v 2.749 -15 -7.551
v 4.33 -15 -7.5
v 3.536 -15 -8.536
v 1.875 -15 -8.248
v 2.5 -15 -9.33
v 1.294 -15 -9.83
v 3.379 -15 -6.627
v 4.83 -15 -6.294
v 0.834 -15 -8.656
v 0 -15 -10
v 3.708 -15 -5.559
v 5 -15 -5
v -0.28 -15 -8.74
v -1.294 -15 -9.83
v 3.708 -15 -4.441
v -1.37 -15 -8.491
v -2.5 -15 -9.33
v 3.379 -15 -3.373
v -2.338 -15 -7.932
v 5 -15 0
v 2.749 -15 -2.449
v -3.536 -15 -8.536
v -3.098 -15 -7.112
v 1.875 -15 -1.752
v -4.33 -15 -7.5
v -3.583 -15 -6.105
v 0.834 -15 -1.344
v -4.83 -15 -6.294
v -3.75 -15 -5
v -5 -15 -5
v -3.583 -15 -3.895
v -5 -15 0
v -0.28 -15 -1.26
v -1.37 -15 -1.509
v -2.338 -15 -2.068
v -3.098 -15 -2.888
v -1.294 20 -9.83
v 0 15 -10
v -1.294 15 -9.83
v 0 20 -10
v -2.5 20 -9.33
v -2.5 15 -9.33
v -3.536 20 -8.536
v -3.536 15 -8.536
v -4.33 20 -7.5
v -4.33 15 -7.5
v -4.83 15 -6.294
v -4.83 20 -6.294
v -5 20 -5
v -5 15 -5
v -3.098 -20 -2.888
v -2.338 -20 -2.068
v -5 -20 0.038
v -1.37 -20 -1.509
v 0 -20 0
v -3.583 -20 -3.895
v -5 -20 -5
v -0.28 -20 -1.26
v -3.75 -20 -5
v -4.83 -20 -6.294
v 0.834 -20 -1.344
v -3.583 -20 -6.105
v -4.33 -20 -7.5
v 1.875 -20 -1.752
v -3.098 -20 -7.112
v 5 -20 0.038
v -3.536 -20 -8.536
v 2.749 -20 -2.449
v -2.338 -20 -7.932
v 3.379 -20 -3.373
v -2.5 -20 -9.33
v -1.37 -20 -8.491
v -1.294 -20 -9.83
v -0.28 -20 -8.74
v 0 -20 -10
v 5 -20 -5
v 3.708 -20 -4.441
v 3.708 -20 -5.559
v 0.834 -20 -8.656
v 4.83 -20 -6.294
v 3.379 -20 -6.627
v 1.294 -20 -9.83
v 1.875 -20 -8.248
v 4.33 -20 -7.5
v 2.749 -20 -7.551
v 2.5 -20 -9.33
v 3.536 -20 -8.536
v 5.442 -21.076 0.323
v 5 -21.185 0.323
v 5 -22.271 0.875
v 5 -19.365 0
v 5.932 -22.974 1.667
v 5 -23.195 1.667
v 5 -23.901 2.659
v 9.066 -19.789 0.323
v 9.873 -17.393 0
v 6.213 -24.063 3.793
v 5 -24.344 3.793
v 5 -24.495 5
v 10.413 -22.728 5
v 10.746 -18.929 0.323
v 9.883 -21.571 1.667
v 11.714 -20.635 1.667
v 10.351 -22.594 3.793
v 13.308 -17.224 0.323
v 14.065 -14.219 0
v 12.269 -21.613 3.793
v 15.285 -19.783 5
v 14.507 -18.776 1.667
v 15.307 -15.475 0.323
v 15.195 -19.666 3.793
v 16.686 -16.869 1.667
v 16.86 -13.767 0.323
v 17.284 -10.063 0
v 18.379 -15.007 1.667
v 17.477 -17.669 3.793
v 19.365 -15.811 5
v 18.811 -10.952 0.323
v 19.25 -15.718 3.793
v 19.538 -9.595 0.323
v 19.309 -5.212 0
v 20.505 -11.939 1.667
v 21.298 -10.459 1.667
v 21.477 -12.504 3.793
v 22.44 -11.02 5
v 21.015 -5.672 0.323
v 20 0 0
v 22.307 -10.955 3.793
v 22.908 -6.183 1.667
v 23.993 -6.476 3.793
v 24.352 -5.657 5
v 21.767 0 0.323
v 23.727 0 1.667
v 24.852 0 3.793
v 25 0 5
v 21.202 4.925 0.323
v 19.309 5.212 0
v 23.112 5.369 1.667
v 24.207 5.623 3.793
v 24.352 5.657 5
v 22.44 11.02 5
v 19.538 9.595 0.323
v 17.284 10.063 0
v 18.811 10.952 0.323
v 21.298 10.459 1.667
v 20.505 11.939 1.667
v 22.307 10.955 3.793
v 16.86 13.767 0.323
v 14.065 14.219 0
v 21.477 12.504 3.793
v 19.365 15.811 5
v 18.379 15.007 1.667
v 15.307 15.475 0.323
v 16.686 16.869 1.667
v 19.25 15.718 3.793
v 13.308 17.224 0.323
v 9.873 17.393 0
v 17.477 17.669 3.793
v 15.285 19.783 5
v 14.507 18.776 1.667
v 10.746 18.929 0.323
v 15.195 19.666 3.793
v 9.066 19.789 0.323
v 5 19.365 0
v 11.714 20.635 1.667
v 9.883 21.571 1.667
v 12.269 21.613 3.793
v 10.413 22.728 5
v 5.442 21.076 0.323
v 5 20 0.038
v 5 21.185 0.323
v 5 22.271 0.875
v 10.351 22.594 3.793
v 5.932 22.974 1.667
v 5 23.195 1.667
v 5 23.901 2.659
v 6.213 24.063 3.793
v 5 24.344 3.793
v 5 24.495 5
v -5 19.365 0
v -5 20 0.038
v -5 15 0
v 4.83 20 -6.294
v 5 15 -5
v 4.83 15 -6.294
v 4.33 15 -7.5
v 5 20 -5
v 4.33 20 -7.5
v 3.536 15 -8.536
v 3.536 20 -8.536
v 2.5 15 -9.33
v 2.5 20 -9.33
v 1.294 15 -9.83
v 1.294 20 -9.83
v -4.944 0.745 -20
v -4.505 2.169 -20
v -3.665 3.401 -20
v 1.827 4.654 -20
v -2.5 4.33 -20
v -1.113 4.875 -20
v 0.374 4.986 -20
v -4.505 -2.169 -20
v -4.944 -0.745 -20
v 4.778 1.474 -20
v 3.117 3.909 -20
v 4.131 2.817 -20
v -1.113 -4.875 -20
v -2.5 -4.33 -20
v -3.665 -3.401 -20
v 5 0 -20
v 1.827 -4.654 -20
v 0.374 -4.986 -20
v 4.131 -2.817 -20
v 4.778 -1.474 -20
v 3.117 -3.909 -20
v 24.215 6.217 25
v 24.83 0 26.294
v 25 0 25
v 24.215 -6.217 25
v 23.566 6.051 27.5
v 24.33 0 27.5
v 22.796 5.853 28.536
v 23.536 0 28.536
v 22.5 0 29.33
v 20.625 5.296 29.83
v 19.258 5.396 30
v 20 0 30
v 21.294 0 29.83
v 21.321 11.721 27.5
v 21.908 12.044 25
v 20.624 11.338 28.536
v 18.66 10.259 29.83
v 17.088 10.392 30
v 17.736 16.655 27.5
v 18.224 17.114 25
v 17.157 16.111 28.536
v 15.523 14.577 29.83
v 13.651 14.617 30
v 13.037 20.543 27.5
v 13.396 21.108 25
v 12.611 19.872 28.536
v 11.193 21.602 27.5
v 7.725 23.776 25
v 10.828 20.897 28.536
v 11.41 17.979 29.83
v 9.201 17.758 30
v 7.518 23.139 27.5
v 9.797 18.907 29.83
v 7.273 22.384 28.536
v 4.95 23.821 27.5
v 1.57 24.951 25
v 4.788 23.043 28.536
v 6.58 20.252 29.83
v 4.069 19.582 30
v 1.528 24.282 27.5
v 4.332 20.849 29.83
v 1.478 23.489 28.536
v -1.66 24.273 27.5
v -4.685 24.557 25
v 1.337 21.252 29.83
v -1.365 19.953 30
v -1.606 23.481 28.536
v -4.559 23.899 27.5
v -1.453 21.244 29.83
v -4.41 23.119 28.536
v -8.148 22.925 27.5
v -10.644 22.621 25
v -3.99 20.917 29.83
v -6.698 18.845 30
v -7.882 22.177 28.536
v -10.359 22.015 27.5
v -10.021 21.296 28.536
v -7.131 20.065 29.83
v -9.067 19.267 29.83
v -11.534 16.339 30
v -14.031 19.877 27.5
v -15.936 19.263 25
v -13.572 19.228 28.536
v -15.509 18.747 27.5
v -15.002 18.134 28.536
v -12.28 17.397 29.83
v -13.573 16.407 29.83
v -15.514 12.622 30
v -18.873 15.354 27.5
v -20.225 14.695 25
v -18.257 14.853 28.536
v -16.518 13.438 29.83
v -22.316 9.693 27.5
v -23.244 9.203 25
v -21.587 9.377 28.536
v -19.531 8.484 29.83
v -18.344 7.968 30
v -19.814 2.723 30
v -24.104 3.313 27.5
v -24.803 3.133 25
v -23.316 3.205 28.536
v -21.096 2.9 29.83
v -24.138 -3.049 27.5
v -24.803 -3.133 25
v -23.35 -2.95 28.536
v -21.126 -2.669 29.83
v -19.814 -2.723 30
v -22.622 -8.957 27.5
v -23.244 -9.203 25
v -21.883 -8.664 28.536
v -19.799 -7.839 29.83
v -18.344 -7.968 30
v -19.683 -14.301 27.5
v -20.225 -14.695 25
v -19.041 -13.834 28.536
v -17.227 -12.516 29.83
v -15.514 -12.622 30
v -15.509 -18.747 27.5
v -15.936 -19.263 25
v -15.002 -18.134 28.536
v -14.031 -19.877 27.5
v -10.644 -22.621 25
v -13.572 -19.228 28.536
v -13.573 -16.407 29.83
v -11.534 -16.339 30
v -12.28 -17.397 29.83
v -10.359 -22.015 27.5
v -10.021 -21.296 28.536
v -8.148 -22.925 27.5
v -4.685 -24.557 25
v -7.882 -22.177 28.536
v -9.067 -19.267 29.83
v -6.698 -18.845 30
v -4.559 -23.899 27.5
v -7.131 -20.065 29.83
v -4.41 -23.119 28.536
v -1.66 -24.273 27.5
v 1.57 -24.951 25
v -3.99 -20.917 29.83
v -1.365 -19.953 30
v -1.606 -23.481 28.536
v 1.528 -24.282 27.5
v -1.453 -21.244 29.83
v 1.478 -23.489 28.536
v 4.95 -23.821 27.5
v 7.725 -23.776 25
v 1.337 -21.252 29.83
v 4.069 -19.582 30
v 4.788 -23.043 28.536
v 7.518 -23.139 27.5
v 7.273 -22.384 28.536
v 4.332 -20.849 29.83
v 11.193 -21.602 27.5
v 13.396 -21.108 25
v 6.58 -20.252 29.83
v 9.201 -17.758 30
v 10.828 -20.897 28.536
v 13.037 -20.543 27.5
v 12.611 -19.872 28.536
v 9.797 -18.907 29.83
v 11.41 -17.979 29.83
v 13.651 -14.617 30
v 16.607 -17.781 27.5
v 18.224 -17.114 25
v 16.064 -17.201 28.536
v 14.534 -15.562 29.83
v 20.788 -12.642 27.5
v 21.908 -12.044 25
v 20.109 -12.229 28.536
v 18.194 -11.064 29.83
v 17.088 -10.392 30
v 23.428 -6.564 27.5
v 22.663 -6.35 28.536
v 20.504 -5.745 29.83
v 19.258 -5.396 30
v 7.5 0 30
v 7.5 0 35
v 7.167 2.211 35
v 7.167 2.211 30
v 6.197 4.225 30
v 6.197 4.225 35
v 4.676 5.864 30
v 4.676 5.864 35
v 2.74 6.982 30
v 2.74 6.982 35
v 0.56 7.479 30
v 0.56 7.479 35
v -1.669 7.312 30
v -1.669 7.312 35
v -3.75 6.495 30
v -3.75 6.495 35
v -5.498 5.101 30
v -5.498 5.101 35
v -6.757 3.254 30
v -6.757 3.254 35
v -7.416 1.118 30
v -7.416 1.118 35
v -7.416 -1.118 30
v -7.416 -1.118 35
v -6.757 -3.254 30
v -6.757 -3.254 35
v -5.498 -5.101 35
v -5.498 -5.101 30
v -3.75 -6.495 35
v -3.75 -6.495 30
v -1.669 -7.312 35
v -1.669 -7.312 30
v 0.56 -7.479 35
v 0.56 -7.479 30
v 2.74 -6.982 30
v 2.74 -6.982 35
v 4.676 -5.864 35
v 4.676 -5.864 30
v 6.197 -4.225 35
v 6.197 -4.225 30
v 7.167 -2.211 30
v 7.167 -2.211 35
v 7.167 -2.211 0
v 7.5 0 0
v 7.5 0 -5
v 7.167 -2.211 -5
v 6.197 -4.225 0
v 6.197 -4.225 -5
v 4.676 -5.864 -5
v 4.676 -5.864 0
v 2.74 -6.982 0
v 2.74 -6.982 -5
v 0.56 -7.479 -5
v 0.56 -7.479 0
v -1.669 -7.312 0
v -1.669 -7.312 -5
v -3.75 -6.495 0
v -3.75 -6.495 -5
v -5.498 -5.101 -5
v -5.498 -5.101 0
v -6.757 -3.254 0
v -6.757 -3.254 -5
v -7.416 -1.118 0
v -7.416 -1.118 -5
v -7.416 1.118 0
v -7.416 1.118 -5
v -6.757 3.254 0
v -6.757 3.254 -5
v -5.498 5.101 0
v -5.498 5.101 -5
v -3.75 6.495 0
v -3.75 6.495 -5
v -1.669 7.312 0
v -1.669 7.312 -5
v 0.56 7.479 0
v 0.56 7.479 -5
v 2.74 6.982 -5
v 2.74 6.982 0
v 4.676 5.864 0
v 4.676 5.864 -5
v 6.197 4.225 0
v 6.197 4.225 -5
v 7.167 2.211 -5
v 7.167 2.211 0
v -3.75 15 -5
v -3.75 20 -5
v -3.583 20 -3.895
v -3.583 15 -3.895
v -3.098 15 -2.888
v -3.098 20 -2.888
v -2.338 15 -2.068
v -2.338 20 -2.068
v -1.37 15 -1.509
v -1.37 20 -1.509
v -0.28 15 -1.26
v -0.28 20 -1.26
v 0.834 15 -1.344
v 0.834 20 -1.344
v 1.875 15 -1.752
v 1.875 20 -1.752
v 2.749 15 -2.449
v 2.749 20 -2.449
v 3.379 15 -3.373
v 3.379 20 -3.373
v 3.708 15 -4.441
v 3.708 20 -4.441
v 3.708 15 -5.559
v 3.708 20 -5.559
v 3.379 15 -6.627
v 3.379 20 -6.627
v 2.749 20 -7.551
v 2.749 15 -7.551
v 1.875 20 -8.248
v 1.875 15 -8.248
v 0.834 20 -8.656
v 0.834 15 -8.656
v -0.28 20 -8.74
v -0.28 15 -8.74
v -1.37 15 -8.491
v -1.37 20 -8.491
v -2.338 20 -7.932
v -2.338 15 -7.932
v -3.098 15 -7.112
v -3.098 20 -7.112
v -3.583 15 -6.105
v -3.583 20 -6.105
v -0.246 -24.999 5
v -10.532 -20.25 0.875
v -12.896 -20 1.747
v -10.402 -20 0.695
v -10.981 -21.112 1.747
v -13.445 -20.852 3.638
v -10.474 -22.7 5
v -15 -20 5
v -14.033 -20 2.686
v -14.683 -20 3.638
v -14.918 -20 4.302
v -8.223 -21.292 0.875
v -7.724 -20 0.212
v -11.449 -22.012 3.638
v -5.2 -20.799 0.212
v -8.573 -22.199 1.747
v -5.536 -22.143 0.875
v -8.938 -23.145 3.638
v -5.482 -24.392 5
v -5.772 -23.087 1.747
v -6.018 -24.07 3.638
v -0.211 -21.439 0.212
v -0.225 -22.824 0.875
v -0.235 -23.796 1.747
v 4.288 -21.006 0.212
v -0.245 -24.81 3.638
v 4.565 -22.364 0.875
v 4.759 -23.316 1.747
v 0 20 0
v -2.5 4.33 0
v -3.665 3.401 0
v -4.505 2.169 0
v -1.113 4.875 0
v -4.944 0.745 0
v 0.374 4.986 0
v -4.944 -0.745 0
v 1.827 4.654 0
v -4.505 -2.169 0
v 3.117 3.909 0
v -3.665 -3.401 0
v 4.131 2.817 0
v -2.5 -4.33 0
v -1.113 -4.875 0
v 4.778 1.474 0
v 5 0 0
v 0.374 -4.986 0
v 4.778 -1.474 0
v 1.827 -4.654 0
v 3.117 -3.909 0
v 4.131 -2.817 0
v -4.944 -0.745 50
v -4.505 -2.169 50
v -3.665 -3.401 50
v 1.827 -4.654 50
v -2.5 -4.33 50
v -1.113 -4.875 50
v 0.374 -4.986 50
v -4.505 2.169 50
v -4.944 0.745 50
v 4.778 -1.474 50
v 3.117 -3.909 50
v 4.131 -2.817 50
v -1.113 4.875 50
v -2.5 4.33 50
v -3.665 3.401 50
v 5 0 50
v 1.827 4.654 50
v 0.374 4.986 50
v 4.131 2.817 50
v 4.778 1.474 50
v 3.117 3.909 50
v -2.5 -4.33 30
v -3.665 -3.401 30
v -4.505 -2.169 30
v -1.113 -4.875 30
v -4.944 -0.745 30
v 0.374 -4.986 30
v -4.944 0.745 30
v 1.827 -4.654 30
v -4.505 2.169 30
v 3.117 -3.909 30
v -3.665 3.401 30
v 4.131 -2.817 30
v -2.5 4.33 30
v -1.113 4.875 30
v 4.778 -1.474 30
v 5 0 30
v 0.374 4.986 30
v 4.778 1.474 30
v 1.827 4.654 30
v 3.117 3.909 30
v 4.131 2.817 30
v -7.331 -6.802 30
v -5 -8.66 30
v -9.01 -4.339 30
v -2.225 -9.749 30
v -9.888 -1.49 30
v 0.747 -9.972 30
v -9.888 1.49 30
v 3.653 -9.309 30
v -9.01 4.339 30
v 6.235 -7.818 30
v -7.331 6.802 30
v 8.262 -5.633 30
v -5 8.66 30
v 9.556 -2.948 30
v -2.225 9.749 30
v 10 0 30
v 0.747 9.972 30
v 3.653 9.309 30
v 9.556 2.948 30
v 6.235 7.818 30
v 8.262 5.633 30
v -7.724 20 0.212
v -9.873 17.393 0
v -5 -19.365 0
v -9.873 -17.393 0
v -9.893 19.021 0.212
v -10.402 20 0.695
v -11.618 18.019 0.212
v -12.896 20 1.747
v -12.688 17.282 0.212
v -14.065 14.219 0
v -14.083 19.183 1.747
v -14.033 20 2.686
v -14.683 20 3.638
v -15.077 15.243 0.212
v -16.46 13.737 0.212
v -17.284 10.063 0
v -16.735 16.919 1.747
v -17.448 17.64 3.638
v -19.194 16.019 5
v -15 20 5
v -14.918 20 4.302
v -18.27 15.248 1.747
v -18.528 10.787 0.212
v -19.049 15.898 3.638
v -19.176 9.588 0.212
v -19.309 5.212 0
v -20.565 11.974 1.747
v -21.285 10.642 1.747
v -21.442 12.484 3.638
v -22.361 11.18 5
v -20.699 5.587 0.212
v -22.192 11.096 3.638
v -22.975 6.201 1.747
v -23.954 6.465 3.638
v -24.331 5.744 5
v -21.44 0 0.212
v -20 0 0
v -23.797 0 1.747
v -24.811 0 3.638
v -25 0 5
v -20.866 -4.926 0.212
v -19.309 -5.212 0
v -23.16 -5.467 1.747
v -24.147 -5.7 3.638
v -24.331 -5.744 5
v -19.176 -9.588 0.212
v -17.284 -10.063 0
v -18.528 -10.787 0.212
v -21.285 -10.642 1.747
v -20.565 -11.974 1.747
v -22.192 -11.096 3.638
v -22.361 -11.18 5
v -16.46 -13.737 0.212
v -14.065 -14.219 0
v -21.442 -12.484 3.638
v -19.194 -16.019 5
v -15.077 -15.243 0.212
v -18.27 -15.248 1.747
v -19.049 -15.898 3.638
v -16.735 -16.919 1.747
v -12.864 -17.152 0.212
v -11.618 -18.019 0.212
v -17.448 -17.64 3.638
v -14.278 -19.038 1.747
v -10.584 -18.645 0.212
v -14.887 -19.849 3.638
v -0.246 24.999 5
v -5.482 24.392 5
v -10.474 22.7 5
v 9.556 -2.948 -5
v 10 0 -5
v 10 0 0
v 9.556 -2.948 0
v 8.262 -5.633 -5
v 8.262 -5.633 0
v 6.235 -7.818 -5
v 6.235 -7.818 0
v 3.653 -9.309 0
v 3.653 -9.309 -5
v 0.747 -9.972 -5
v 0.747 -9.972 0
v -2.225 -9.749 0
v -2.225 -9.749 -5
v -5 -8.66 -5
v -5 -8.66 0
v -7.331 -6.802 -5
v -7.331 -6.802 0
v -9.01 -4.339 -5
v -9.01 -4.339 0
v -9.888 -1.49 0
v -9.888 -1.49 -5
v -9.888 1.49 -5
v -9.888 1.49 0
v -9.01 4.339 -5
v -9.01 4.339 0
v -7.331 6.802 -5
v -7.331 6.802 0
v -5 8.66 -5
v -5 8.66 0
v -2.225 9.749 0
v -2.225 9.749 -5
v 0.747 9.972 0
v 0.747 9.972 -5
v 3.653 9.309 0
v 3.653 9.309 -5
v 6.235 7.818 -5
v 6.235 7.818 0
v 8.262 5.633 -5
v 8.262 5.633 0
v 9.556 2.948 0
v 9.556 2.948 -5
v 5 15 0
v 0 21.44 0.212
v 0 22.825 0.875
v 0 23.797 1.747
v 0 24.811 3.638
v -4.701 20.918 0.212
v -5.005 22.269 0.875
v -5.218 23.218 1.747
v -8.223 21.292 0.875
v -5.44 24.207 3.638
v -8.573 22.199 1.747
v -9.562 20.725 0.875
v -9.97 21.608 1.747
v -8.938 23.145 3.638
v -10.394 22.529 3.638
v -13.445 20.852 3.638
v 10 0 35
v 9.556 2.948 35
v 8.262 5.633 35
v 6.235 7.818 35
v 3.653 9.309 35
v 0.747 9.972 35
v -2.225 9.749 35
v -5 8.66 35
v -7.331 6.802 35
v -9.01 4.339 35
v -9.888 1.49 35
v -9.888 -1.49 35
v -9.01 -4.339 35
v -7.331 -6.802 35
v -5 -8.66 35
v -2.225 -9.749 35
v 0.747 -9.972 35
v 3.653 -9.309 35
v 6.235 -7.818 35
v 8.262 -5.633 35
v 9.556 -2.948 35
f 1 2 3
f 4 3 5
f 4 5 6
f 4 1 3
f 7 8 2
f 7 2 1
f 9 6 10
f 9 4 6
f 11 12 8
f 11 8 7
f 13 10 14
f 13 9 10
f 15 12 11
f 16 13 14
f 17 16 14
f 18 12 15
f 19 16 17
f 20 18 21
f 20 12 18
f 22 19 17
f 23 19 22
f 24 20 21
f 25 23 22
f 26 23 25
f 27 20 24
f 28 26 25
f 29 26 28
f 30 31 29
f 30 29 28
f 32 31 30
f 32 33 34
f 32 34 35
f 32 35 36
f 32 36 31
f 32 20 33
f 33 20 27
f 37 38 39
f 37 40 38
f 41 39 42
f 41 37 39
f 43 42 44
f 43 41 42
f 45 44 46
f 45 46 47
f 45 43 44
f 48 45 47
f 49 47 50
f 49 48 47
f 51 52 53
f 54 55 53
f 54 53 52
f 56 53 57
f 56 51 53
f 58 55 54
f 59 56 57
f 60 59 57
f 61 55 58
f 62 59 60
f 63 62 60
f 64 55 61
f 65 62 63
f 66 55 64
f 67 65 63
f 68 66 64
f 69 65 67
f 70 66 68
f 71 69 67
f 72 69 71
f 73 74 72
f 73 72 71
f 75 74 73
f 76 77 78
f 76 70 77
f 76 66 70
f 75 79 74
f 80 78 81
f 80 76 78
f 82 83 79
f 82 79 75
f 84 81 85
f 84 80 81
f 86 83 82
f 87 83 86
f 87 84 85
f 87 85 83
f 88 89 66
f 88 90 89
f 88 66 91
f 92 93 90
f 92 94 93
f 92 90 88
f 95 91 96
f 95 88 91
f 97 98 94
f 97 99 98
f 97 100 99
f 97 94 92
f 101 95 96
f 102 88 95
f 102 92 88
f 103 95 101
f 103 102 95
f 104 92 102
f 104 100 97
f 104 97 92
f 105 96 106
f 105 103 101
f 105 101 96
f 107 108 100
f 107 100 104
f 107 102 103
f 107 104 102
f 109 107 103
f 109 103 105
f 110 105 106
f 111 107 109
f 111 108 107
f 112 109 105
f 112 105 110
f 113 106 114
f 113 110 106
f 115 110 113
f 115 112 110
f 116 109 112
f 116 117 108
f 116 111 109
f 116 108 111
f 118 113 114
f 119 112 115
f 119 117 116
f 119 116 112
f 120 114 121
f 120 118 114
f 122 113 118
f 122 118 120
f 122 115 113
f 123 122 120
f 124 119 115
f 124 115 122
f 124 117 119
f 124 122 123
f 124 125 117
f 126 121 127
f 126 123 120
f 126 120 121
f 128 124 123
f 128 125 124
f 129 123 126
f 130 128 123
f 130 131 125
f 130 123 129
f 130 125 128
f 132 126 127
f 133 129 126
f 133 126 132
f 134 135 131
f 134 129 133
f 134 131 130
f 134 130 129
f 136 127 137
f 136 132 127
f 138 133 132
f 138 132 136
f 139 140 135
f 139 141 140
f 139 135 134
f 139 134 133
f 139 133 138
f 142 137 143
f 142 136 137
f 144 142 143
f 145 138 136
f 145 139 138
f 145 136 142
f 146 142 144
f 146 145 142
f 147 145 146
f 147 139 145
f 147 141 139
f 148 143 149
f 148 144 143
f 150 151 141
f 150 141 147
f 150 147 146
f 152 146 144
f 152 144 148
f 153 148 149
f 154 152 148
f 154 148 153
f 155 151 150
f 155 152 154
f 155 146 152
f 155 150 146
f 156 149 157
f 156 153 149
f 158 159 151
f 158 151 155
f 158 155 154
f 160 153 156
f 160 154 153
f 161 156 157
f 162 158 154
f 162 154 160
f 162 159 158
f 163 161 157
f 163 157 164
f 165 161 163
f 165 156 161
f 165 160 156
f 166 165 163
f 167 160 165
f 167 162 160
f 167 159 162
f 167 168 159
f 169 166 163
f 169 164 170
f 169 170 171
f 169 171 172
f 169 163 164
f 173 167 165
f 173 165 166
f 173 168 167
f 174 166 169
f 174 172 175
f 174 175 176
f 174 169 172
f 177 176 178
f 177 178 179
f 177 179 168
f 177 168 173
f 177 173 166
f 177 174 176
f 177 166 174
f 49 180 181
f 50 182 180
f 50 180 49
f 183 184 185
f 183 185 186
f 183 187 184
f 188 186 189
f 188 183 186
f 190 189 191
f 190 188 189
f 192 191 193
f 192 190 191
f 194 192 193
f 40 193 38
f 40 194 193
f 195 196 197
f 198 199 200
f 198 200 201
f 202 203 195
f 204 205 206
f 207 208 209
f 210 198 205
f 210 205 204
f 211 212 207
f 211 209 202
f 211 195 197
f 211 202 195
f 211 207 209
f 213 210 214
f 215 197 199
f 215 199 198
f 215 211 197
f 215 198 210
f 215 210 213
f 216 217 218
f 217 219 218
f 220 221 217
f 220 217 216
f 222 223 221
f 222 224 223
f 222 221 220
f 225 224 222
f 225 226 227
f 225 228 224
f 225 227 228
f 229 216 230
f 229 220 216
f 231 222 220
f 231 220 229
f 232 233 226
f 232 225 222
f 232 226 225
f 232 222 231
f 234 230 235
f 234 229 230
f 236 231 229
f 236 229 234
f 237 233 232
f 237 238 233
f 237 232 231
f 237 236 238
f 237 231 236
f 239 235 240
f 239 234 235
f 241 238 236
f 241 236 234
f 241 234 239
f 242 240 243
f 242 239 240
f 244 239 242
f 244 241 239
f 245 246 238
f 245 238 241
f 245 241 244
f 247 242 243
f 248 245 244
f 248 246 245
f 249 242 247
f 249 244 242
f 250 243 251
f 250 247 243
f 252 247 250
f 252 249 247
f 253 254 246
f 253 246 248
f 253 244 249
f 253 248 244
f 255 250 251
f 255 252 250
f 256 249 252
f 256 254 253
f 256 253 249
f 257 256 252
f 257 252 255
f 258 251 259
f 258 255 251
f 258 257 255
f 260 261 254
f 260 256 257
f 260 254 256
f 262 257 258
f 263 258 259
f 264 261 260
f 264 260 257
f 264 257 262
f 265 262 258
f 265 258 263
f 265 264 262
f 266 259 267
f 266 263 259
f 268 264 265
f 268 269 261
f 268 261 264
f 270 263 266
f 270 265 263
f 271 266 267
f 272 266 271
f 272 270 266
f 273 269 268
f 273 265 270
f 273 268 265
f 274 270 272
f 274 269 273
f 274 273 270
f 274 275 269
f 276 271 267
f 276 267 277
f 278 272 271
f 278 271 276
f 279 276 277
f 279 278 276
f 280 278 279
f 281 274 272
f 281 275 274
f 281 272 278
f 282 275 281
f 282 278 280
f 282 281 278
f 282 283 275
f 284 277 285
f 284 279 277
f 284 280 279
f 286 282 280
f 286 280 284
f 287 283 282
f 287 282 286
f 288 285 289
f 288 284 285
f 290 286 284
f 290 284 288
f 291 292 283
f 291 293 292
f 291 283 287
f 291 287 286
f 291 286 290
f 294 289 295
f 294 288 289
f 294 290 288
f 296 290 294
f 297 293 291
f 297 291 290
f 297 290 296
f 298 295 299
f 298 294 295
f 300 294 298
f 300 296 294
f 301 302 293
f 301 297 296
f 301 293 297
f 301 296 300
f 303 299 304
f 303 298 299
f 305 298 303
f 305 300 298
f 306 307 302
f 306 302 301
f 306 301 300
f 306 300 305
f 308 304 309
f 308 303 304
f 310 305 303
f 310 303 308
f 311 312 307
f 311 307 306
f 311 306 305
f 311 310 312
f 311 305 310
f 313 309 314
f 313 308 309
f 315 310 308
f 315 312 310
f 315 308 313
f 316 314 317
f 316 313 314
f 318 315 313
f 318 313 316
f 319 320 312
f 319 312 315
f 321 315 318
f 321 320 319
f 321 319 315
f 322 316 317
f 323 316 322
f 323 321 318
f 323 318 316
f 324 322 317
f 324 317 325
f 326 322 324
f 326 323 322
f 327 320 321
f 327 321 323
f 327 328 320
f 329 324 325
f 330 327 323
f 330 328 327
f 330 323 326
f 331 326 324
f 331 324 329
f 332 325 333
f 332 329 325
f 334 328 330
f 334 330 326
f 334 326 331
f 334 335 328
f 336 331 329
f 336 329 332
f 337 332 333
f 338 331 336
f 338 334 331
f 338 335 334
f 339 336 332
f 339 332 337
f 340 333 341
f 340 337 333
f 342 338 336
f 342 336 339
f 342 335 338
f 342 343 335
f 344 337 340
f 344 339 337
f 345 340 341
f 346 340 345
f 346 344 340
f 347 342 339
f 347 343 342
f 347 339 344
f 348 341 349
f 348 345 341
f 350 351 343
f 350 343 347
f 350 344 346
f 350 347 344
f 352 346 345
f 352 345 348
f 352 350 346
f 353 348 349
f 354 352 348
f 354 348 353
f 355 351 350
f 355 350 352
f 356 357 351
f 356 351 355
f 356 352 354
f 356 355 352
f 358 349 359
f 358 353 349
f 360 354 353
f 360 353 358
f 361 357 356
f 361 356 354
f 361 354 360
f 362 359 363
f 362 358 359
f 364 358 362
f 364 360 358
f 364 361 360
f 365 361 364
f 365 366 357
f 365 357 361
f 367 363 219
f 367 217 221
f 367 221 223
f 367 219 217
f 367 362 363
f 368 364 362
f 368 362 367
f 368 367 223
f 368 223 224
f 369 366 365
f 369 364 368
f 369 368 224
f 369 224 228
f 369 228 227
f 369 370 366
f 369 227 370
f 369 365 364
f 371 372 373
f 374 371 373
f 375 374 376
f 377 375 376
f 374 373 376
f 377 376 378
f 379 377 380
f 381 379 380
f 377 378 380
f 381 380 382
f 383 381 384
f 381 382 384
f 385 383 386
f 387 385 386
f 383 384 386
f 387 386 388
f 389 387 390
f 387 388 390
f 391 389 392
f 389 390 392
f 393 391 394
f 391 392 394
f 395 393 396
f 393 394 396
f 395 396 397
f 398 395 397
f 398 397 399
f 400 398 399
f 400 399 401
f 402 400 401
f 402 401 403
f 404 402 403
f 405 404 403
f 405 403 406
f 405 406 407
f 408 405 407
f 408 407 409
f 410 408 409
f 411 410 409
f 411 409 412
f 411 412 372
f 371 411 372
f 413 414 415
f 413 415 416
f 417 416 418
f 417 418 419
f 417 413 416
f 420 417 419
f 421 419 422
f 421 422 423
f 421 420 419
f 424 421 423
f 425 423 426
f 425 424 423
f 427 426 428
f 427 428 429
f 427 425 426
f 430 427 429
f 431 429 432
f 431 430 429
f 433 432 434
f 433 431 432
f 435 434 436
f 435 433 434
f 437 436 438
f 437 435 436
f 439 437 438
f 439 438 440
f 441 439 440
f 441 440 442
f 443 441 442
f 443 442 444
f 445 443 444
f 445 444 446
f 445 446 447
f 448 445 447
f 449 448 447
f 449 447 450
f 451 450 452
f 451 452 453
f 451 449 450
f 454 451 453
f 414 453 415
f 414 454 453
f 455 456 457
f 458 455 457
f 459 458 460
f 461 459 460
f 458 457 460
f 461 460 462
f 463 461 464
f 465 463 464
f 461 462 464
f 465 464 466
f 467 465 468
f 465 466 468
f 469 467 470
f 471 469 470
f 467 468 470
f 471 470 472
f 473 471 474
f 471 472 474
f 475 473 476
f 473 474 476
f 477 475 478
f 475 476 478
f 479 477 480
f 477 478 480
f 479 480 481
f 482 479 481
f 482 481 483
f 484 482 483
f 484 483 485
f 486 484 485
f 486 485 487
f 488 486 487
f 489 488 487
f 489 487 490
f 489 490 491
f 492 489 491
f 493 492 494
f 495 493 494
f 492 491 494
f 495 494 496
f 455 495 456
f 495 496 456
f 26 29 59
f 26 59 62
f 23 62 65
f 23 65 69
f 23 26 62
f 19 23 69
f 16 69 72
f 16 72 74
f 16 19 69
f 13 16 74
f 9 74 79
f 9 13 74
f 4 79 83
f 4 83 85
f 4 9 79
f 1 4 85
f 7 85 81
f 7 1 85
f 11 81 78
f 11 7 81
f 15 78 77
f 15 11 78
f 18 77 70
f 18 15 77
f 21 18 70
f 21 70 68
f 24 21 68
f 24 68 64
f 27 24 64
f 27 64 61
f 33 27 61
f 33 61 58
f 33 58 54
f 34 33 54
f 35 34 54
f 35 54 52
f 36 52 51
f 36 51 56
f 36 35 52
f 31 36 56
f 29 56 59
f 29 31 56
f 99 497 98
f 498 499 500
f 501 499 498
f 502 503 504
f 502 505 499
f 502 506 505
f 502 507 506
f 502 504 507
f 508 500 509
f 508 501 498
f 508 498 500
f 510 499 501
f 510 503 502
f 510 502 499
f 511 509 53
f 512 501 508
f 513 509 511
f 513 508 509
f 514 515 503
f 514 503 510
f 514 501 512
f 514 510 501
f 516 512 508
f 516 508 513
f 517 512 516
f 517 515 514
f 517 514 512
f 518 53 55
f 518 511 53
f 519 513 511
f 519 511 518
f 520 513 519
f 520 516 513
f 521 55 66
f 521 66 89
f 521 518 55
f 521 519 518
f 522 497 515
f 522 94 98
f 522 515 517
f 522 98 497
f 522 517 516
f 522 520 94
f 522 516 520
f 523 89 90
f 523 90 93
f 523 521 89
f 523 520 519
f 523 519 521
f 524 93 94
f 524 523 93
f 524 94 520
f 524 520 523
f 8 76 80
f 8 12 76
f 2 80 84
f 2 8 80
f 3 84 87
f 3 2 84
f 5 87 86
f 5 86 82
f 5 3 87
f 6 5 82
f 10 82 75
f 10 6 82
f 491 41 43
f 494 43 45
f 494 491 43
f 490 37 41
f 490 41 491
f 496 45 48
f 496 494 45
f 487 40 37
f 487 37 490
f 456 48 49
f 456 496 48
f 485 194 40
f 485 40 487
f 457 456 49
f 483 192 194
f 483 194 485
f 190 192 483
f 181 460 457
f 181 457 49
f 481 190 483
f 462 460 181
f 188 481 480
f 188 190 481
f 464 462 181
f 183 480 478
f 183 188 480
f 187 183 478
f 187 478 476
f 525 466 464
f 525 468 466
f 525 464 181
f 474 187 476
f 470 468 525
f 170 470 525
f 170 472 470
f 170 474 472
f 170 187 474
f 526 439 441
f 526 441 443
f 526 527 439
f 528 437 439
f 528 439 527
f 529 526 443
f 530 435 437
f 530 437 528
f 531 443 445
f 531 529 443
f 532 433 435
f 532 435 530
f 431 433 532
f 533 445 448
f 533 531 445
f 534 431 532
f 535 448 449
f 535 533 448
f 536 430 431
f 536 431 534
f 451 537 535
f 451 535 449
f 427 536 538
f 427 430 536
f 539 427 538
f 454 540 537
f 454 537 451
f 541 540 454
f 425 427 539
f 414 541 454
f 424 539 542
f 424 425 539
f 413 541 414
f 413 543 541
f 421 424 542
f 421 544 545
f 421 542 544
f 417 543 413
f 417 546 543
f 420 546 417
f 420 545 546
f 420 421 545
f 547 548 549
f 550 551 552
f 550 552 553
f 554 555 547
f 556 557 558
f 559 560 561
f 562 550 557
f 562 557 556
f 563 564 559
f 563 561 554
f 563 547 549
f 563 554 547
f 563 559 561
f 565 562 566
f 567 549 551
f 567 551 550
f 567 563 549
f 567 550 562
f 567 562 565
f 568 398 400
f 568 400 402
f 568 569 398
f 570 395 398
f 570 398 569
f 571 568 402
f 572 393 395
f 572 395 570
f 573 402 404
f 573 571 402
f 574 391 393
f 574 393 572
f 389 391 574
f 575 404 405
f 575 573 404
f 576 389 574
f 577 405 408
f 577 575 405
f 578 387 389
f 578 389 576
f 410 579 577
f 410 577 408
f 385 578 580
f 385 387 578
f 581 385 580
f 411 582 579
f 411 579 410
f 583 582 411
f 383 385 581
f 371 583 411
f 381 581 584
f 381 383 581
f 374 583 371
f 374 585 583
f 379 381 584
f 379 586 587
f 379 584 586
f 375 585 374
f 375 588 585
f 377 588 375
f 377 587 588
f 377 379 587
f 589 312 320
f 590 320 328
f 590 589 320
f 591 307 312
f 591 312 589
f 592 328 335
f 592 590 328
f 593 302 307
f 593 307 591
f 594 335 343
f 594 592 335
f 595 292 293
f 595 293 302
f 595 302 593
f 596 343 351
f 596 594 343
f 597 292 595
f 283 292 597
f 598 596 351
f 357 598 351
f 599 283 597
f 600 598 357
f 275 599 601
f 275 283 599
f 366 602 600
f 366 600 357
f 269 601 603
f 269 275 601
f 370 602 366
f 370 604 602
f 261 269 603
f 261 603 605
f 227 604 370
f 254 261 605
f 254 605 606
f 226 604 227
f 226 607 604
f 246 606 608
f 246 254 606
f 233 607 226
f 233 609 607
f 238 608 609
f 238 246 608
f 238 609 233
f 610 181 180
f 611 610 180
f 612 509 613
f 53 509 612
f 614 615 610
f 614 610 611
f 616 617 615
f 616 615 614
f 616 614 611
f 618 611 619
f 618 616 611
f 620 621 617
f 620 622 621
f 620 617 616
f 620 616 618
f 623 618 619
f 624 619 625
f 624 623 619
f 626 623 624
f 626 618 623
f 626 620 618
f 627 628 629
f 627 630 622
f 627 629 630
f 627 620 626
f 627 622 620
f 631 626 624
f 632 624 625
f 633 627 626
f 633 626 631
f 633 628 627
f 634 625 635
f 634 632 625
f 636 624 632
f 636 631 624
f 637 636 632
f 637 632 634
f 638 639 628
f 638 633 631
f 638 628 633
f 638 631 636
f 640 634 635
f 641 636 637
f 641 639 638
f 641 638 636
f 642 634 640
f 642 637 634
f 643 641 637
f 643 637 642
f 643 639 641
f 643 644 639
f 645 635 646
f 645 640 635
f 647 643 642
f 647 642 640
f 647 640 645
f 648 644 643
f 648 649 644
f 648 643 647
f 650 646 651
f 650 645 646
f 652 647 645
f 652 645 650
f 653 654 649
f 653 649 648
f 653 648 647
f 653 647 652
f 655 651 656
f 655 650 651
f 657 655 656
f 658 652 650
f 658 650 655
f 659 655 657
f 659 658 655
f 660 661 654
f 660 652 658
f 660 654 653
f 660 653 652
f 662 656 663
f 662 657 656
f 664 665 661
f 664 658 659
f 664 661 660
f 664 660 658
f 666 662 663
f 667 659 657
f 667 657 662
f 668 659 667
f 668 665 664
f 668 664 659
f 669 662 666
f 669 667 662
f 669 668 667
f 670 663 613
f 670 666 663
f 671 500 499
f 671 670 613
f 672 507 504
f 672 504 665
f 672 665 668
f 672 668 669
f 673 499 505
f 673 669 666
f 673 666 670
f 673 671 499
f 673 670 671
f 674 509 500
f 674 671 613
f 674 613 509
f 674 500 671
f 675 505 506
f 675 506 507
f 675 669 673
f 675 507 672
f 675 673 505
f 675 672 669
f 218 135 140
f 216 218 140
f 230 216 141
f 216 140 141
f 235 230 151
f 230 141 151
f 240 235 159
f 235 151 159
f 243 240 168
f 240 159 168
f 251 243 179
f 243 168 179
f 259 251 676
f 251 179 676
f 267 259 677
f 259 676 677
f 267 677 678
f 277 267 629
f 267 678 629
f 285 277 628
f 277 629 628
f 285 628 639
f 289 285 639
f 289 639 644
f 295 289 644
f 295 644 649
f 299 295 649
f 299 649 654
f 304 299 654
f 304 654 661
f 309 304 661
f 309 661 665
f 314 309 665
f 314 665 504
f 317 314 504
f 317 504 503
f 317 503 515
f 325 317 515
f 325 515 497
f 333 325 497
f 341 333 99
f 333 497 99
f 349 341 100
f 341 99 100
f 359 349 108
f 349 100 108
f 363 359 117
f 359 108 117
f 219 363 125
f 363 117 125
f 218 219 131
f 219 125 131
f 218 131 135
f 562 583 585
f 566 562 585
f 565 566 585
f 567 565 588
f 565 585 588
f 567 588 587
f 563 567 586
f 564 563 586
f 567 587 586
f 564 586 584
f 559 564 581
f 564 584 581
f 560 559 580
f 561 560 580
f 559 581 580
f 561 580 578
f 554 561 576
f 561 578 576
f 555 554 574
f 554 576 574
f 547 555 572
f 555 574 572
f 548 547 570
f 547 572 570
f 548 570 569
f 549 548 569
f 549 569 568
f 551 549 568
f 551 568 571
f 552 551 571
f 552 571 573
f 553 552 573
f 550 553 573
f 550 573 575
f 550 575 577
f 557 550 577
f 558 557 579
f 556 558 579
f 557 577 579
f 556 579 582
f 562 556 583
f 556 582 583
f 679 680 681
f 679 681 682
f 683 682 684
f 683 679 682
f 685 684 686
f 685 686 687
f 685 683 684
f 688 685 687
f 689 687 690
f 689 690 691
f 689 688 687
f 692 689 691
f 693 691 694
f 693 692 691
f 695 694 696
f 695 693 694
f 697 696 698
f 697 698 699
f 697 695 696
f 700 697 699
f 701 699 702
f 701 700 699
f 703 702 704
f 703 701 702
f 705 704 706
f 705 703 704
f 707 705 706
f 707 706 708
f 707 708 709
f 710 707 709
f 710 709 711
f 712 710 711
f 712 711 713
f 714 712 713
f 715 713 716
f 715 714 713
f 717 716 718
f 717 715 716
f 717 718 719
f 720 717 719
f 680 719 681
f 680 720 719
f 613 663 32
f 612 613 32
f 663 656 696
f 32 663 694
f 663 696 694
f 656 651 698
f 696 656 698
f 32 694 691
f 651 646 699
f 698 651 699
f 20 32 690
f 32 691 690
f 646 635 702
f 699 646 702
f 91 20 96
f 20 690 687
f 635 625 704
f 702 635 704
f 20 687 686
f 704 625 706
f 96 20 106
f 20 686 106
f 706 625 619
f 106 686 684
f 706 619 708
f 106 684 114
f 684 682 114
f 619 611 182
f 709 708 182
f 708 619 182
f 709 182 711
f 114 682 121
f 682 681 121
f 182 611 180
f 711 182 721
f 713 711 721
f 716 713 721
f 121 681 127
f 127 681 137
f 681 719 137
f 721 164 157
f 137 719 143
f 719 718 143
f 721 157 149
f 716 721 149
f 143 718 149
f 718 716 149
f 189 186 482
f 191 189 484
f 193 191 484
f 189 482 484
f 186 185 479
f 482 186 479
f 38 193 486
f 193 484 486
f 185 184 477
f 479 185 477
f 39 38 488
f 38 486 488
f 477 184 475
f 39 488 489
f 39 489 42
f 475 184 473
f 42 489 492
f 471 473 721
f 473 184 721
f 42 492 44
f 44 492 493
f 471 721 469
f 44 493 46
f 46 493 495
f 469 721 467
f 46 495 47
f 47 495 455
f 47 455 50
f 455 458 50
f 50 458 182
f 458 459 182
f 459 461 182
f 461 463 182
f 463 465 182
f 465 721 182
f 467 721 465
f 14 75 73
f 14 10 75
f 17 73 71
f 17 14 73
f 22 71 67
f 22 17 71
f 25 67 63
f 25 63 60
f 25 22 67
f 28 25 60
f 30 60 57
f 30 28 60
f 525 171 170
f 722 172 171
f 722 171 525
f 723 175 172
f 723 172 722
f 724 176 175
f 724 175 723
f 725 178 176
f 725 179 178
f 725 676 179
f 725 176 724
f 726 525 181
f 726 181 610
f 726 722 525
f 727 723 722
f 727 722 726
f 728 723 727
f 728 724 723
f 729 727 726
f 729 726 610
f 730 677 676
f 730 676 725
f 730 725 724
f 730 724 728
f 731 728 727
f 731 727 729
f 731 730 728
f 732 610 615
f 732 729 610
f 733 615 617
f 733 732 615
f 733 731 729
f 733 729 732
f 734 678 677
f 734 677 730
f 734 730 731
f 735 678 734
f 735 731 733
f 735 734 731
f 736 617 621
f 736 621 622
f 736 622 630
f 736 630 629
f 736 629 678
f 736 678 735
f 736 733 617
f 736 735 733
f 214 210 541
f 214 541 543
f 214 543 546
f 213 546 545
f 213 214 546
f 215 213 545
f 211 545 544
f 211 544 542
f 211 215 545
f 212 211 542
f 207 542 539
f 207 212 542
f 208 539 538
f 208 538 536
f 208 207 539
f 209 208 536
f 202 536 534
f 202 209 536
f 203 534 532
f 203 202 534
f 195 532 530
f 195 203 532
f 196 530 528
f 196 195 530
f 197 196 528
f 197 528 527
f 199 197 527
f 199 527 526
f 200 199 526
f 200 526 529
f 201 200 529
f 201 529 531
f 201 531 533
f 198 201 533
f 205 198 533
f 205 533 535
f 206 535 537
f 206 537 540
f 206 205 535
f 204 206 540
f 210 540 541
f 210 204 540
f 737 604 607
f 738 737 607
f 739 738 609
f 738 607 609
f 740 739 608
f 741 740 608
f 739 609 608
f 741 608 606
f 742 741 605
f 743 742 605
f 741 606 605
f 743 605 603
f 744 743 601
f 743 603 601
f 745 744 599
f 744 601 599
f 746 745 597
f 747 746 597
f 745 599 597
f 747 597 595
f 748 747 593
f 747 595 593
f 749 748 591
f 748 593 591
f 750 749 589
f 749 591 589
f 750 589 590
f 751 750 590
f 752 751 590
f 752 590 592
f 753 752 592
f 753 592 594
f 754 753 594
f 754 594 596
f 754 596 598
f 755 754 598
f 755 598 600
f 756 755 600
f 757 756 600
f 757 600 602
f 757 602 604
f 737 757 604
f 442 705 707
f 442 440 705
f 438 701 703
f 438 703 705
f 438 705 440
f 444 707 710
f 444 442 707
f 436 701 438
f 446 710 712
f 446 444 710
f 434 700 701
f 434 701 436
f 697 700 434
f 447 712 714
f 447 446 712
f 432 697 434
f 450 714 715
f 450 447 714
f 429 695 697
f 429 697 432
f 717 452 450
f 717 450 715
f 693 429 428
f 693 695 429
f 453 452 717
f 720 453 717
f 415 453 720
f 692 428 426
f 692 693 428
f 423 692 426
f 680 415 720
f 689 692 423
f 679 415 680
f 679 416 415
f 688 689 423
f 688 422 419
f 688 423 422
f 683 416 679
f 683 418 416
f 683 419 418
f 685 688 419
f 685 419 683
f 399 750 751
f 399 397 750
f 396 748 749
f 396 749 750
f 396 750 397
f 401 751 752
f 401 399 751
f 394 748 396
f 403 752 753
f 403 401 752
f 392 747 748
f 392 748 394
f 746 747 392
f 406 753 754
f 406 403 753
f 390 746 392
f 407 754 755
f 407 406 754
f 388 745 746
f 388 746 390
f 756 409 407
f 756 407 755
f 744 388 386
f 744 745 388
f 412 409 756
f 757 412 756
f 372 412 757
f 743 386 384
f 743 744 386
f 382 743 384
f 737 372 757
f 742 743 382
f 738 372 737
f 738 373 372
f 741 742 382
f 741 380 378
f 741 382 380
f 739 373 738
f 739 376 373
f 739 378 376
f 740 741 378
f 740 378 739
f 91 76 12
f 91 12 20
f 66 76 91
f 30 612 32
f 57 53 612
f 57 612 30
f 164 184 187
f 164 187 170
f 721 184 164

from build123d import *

# Parameters (mm, degrees)
SKETCH1_R           = 25
BOSS_EXTRUDE1_DEPTH = 30
SKETCH2_R           = 10
BOSS_EXTRUDE2_DEPTH = 20
SKETCH3_R           = 7.5
CUT_EXTRUDE1_DEPTH  = 20
SKETCH4_R           = 5
BOSS_EXTRUDE3_DEPTH = 20
BOSS_EXTRUDE4_START = 5
SKETCH5_R           = 10
BOSS_EXTRUDE4_DEPTH = 5
SKETCH7_W           = 10
SKETCH7_H           = 5
BOSS_EXTRUDE5_DEPTH = 10
SKETCH8_R           = 3.75
CUT_EXTRUDE2_DEPTH  = 5
CUT_EXTRUDE3_START  = -5
SKETCH9_R           = 3.75
CUT_EXTRUDE3_DEPTH  = 5
FILLET1_R           = 5
FILLET2_R           = 5
CUT_EXTRUDE4_START  = -15
SKETCH10_R          = 10
SKETCH10_R_2        = 7.5
CUT_EXTRUDE4_DEPTH  = 15
CUT_EXTRUDE5_START  = -5
SKETCH11_R          = 7.5
CUT_EXTRUDE5_DEPTH  = 5
BOSS_EXTRUDE6_START = 20
SKETCH12_R          = 5
BOSS_EXTRUDE6_DEPTH = 20


# Some blends are built 0.0001 mm under size
with BuildPart() as part:
    # Sketch1 → Boss-Extrude1 (new body)
    with BuildSketch(Plane.XY):
        Circle(SKETCH1_R)
    extrude(amount=BOSS_EXTRUDE1_DEPTH)

    # Sketch2 → Boss-Extrude2 (add)
    with BuildSketch(Plane.XY.offset(30)):
        Circle(SKETCH2_R)
    extrude(amount=BOSS_EXTRUDE2_DEPTH)

    # Sketch3 → Cut-Extrude1 (cut)
    with BuildSketch(Plane.XY.offset(50)):
        Circle(SKETCH3_R)
    extrude(amount=-CUT_EXTRUDE1_DEPTH, mode=Mode.SUBTRACT)

    # Sketch4 → Boss-Extrude3 (add)
    with BuildSketch(Plane.XY.offset(30)):
        Circle(SKETCH4_R)
    extrude(amount=BOSS_EXTRUDE3_DEPTH)

    # Sketch5 → Boss-Extrude4 (add)
    with BuildSketch(Plane(origin=(0, 0, 0), x_dir=(-1, 0, 0), z_dir=(0, 0, -1)).offset(BOSS_EXTRUDE4_START)):
        with Locations(Location((0, 0, 0), (0, 0, 180))):
            Circle(SKETCH5_R)
    extrude(amount=-BOSS_EXTRUDE4_DEPTH)

    # Sketch7 → Boss-Extrude5 (add)
    with BuildSketch(Plane(origin=(0, 0, 0), x_dir=(-1, 0, 0), z_dir=(0, 0, -1))):
        with Locations((0, 17.5)):
            Rectangle(SKETCH7_W, SKETCH7_H)
        with Locations((0, -17.5)):
            Rectangle(SKETCH7_W, SKETCH7_H)
    extrude(amount=BOSS_EXTRUDE5_DEPTH)

    # Sketch8 → Cut-Extrude2 (cut)
    with BuildSketch(Plane(origin=(0, 20, 0), x_dir=(1, 0, 0), z_dir=(0, 1, 0))):
        with Locations(Location((0, 5, 0), (0, 0, 180))):
            Circle(SKETCH8_R)
    extrude(amount=-CUT_EXTRUDE2_DEPTH, mode=Mode.SUBTRACT)

    # Sketch9 → Cut-Extrude3 (cut)
    with BuildSketch(Plane(origin=(0, -20, 0), x_dir=(-1, 0, 0), z_dir=(0, -1, 0)).offset(CUT_EXTRUDE3_START)):
        with Locations((0, 5)):
            Circle(SKETCH9_R)
    extrude(amount=CUT_EXTRUDE3_DEPTH, mode=Mode.SUBTRACT)

    # Fillet1
    # the kernel refuses this fillet: 5 mm, written as the material it takes off along each edge
    with BuildSketch(Plane(origin=(0, 0, 30), x_dir=(1, 0, 0), z_dir=(0, -1, 0))) as fillet1_piece_1:
        with BuildLine():
            CenterArc((25 - FILLET1_R, -FILLET1_R), FILLET1_R, 0, 90)
            Line((25 - FILLET1_R, 0), (25, 0))
            Line((25, 0), (25, -FILLET1_R))
        make_face()
    revolve(axis=Axis((0, 0, 30), (0, 0, 1)), mode=Mode.SUBTRACT)
    with BuildSketch(Plane(origin=(0, 0, 0), x_dir=(1, 0, 0), z_dir=(0, -1, 0))) as fillet1_piece_2_section:
        with BuildLine():
            CenterArc((25 - FILLET1_R, FILLET1_R), FILLET1_R, 270, 90)
            Line((25 - FILLET1_R, 0), (25, 0))
            Line((25, 0), (25, FILLET1_R))
        make_face()
    fillet1_piece_2 = revolve(axis=Axis((0, 0, 0), (0, 0, 1)), mode=Mode.PRIVATE)
    fillet1_piece_2 = split(fillet1_piece_2, bisect_by=Plane(origin=(5, 14.511659558, 1.419610571), z_dir=(1, 0, 0)), keep=Keep.TOP, mode=Mode.PRIVATE)
    add(fillet1_piece_2, mode=Mode.SUBTRACT)
    with BuildSketch(Plane(origin=(0, 0, 0), x_dir=(1, 0, 0), z_dir=(0, -1, 0))) as fillet1_piece_3_section:
        with BuildLine():
            CenterArc((25 - FILLET1_R, FILLET1_R), FILLET1_R, 270, 90)
            Line((25 - FILLET1_R, 0), (25, 0))
            Line((25, 0), (25, FILLET1_R))
        make_face()
    fillet1_piece_3 = revolve(axis=Axis((0, 0, 0), (0, 0, 1)), mode=Mode.PRIVATE)
    fillet1_piece_3 = split(fillet1_piece_3, bisect_by=Plane(origin=(4.6e-08, 20, 1.116734198), z_dir=(0, 1, 0)), keep=Keep.TOP, mode=Mode.PRIVATE)
    add(fillet1_piece_3, mode=Mode.SUBTRACT)
    with BuildSketch(Plane(origin=(0, 0, 0), x_dir=(1, 0, 0), z_dir=(0, -1, 0))) as fillet1_piece_4_section:
        with BuildLine():
            CenterArc((25 - FILLET1_R, FILLET1_R), FILLET1_R, 270, 90)
            Line((25 - FILLET1_R, 0), (25, 0))
            Line((25, 0), (25, FILLET1_R))
        make_face()
    fillet1_piece_4 = revolve(axis=Axis((0, 0, 0), (0, 0, 1)), mode=Mode.PRIVATE)
    fillet1_piece_4 = split(fillet1_piece_4, bisect_by=Plane(origin=(-4.6e-08, -20, 1.116734198), z_dir=(0, -1, 0)), keep=Keep.TOP, mode=Mode.PRIVATE)
    add(fillet1_piece_4, mode=Mode.SUBTRACT)
    with BuildSketch(Plane(origin=(0, 0, 0), x_dir=(1, 0, 0), z_dir=(0, -1, 0))) as fillet1_piece_5_section:
        with BuildLine():
            CenterArc((25 - FILLET1_R, FILLET1_R), FILLET1_R, 270, 90)
            Line((25 - FILLET1_R, 0), (25, 0))
            Line((25, 0), (25, FILLET1_R))
        make_face()
    fillet1_piece_5 = revolve(axis=Axis((0, 0, 0), (0, 0, 1)), mode=Mode.PRIVATE)
    fillet1_piece_5 = split(fillet1_piece_5, bisect_by=Plane(origin=(-5, 0, 1.419610538), z_dir=(-1, 0, 0)), keep=Keep.TOP, mode=Mode.PRIVATE)
    add(fillet1_piece_5, mode=Mode.SUBTRACT)

    # Fillet2
    fillet2_edges = [part.edges().sort_by_distance(p)[0] for p in [
        (5, -17.5, -10),
        (-5, -17.5, -10),
        (5, 17.5, -10),
        (-5, 17.5, -10),
    ]]
    fillet(fillet2_edges, radius=FILLET2_R - 0.0001)  # a hair under: the kernel refuses the full size

    # Sketch10 → Cut-Extrude4 (cut)
    with BuildSketch(Plane.XY.offset(50).offset(CUT_EXTRUDE4_START)):
        Circle(SKETCH10_R)
        Circle(SKETCH10_R_2, mode=Mode.SUBTRACT)
    extrude(amount=CUT_EXTRUDE4_DEPTH, mode=Mode.SUBTRACT)

    # Sketch11 → Cut-Extrude5 (cut)
    with BuildSketch(Plane(origin=(0, 0, -5), x_dir=(-1, 0, 0), z_dir=(0, 0, -1)).offset(CUT_EXTRUDE5_START)):
        with Locations(Location((0, 0, 0), (0, 0, 180))):
            Circle(SKETCH11_R)
    extrude(amount=CUT_EXTRUDE5_DEPTH, mode=Mode.SUBTRACT)

    # Sketch12 → Boss-Extrude6 (add)
    with BuildSketch(Plane(origin=(0, 0, 0), x_dir=(-1, 0, 0), z_dir=(0, 0, -1)).offset(BOSS_EXTRUDE6_START)):
        with Locations(Location((0, 0, 0), (0, 0, 180))):
            Circle(SKETCH12_R)
    extrude(amount=-BOSS_EXTRUDE6_DEPTH)


solid = part.part
